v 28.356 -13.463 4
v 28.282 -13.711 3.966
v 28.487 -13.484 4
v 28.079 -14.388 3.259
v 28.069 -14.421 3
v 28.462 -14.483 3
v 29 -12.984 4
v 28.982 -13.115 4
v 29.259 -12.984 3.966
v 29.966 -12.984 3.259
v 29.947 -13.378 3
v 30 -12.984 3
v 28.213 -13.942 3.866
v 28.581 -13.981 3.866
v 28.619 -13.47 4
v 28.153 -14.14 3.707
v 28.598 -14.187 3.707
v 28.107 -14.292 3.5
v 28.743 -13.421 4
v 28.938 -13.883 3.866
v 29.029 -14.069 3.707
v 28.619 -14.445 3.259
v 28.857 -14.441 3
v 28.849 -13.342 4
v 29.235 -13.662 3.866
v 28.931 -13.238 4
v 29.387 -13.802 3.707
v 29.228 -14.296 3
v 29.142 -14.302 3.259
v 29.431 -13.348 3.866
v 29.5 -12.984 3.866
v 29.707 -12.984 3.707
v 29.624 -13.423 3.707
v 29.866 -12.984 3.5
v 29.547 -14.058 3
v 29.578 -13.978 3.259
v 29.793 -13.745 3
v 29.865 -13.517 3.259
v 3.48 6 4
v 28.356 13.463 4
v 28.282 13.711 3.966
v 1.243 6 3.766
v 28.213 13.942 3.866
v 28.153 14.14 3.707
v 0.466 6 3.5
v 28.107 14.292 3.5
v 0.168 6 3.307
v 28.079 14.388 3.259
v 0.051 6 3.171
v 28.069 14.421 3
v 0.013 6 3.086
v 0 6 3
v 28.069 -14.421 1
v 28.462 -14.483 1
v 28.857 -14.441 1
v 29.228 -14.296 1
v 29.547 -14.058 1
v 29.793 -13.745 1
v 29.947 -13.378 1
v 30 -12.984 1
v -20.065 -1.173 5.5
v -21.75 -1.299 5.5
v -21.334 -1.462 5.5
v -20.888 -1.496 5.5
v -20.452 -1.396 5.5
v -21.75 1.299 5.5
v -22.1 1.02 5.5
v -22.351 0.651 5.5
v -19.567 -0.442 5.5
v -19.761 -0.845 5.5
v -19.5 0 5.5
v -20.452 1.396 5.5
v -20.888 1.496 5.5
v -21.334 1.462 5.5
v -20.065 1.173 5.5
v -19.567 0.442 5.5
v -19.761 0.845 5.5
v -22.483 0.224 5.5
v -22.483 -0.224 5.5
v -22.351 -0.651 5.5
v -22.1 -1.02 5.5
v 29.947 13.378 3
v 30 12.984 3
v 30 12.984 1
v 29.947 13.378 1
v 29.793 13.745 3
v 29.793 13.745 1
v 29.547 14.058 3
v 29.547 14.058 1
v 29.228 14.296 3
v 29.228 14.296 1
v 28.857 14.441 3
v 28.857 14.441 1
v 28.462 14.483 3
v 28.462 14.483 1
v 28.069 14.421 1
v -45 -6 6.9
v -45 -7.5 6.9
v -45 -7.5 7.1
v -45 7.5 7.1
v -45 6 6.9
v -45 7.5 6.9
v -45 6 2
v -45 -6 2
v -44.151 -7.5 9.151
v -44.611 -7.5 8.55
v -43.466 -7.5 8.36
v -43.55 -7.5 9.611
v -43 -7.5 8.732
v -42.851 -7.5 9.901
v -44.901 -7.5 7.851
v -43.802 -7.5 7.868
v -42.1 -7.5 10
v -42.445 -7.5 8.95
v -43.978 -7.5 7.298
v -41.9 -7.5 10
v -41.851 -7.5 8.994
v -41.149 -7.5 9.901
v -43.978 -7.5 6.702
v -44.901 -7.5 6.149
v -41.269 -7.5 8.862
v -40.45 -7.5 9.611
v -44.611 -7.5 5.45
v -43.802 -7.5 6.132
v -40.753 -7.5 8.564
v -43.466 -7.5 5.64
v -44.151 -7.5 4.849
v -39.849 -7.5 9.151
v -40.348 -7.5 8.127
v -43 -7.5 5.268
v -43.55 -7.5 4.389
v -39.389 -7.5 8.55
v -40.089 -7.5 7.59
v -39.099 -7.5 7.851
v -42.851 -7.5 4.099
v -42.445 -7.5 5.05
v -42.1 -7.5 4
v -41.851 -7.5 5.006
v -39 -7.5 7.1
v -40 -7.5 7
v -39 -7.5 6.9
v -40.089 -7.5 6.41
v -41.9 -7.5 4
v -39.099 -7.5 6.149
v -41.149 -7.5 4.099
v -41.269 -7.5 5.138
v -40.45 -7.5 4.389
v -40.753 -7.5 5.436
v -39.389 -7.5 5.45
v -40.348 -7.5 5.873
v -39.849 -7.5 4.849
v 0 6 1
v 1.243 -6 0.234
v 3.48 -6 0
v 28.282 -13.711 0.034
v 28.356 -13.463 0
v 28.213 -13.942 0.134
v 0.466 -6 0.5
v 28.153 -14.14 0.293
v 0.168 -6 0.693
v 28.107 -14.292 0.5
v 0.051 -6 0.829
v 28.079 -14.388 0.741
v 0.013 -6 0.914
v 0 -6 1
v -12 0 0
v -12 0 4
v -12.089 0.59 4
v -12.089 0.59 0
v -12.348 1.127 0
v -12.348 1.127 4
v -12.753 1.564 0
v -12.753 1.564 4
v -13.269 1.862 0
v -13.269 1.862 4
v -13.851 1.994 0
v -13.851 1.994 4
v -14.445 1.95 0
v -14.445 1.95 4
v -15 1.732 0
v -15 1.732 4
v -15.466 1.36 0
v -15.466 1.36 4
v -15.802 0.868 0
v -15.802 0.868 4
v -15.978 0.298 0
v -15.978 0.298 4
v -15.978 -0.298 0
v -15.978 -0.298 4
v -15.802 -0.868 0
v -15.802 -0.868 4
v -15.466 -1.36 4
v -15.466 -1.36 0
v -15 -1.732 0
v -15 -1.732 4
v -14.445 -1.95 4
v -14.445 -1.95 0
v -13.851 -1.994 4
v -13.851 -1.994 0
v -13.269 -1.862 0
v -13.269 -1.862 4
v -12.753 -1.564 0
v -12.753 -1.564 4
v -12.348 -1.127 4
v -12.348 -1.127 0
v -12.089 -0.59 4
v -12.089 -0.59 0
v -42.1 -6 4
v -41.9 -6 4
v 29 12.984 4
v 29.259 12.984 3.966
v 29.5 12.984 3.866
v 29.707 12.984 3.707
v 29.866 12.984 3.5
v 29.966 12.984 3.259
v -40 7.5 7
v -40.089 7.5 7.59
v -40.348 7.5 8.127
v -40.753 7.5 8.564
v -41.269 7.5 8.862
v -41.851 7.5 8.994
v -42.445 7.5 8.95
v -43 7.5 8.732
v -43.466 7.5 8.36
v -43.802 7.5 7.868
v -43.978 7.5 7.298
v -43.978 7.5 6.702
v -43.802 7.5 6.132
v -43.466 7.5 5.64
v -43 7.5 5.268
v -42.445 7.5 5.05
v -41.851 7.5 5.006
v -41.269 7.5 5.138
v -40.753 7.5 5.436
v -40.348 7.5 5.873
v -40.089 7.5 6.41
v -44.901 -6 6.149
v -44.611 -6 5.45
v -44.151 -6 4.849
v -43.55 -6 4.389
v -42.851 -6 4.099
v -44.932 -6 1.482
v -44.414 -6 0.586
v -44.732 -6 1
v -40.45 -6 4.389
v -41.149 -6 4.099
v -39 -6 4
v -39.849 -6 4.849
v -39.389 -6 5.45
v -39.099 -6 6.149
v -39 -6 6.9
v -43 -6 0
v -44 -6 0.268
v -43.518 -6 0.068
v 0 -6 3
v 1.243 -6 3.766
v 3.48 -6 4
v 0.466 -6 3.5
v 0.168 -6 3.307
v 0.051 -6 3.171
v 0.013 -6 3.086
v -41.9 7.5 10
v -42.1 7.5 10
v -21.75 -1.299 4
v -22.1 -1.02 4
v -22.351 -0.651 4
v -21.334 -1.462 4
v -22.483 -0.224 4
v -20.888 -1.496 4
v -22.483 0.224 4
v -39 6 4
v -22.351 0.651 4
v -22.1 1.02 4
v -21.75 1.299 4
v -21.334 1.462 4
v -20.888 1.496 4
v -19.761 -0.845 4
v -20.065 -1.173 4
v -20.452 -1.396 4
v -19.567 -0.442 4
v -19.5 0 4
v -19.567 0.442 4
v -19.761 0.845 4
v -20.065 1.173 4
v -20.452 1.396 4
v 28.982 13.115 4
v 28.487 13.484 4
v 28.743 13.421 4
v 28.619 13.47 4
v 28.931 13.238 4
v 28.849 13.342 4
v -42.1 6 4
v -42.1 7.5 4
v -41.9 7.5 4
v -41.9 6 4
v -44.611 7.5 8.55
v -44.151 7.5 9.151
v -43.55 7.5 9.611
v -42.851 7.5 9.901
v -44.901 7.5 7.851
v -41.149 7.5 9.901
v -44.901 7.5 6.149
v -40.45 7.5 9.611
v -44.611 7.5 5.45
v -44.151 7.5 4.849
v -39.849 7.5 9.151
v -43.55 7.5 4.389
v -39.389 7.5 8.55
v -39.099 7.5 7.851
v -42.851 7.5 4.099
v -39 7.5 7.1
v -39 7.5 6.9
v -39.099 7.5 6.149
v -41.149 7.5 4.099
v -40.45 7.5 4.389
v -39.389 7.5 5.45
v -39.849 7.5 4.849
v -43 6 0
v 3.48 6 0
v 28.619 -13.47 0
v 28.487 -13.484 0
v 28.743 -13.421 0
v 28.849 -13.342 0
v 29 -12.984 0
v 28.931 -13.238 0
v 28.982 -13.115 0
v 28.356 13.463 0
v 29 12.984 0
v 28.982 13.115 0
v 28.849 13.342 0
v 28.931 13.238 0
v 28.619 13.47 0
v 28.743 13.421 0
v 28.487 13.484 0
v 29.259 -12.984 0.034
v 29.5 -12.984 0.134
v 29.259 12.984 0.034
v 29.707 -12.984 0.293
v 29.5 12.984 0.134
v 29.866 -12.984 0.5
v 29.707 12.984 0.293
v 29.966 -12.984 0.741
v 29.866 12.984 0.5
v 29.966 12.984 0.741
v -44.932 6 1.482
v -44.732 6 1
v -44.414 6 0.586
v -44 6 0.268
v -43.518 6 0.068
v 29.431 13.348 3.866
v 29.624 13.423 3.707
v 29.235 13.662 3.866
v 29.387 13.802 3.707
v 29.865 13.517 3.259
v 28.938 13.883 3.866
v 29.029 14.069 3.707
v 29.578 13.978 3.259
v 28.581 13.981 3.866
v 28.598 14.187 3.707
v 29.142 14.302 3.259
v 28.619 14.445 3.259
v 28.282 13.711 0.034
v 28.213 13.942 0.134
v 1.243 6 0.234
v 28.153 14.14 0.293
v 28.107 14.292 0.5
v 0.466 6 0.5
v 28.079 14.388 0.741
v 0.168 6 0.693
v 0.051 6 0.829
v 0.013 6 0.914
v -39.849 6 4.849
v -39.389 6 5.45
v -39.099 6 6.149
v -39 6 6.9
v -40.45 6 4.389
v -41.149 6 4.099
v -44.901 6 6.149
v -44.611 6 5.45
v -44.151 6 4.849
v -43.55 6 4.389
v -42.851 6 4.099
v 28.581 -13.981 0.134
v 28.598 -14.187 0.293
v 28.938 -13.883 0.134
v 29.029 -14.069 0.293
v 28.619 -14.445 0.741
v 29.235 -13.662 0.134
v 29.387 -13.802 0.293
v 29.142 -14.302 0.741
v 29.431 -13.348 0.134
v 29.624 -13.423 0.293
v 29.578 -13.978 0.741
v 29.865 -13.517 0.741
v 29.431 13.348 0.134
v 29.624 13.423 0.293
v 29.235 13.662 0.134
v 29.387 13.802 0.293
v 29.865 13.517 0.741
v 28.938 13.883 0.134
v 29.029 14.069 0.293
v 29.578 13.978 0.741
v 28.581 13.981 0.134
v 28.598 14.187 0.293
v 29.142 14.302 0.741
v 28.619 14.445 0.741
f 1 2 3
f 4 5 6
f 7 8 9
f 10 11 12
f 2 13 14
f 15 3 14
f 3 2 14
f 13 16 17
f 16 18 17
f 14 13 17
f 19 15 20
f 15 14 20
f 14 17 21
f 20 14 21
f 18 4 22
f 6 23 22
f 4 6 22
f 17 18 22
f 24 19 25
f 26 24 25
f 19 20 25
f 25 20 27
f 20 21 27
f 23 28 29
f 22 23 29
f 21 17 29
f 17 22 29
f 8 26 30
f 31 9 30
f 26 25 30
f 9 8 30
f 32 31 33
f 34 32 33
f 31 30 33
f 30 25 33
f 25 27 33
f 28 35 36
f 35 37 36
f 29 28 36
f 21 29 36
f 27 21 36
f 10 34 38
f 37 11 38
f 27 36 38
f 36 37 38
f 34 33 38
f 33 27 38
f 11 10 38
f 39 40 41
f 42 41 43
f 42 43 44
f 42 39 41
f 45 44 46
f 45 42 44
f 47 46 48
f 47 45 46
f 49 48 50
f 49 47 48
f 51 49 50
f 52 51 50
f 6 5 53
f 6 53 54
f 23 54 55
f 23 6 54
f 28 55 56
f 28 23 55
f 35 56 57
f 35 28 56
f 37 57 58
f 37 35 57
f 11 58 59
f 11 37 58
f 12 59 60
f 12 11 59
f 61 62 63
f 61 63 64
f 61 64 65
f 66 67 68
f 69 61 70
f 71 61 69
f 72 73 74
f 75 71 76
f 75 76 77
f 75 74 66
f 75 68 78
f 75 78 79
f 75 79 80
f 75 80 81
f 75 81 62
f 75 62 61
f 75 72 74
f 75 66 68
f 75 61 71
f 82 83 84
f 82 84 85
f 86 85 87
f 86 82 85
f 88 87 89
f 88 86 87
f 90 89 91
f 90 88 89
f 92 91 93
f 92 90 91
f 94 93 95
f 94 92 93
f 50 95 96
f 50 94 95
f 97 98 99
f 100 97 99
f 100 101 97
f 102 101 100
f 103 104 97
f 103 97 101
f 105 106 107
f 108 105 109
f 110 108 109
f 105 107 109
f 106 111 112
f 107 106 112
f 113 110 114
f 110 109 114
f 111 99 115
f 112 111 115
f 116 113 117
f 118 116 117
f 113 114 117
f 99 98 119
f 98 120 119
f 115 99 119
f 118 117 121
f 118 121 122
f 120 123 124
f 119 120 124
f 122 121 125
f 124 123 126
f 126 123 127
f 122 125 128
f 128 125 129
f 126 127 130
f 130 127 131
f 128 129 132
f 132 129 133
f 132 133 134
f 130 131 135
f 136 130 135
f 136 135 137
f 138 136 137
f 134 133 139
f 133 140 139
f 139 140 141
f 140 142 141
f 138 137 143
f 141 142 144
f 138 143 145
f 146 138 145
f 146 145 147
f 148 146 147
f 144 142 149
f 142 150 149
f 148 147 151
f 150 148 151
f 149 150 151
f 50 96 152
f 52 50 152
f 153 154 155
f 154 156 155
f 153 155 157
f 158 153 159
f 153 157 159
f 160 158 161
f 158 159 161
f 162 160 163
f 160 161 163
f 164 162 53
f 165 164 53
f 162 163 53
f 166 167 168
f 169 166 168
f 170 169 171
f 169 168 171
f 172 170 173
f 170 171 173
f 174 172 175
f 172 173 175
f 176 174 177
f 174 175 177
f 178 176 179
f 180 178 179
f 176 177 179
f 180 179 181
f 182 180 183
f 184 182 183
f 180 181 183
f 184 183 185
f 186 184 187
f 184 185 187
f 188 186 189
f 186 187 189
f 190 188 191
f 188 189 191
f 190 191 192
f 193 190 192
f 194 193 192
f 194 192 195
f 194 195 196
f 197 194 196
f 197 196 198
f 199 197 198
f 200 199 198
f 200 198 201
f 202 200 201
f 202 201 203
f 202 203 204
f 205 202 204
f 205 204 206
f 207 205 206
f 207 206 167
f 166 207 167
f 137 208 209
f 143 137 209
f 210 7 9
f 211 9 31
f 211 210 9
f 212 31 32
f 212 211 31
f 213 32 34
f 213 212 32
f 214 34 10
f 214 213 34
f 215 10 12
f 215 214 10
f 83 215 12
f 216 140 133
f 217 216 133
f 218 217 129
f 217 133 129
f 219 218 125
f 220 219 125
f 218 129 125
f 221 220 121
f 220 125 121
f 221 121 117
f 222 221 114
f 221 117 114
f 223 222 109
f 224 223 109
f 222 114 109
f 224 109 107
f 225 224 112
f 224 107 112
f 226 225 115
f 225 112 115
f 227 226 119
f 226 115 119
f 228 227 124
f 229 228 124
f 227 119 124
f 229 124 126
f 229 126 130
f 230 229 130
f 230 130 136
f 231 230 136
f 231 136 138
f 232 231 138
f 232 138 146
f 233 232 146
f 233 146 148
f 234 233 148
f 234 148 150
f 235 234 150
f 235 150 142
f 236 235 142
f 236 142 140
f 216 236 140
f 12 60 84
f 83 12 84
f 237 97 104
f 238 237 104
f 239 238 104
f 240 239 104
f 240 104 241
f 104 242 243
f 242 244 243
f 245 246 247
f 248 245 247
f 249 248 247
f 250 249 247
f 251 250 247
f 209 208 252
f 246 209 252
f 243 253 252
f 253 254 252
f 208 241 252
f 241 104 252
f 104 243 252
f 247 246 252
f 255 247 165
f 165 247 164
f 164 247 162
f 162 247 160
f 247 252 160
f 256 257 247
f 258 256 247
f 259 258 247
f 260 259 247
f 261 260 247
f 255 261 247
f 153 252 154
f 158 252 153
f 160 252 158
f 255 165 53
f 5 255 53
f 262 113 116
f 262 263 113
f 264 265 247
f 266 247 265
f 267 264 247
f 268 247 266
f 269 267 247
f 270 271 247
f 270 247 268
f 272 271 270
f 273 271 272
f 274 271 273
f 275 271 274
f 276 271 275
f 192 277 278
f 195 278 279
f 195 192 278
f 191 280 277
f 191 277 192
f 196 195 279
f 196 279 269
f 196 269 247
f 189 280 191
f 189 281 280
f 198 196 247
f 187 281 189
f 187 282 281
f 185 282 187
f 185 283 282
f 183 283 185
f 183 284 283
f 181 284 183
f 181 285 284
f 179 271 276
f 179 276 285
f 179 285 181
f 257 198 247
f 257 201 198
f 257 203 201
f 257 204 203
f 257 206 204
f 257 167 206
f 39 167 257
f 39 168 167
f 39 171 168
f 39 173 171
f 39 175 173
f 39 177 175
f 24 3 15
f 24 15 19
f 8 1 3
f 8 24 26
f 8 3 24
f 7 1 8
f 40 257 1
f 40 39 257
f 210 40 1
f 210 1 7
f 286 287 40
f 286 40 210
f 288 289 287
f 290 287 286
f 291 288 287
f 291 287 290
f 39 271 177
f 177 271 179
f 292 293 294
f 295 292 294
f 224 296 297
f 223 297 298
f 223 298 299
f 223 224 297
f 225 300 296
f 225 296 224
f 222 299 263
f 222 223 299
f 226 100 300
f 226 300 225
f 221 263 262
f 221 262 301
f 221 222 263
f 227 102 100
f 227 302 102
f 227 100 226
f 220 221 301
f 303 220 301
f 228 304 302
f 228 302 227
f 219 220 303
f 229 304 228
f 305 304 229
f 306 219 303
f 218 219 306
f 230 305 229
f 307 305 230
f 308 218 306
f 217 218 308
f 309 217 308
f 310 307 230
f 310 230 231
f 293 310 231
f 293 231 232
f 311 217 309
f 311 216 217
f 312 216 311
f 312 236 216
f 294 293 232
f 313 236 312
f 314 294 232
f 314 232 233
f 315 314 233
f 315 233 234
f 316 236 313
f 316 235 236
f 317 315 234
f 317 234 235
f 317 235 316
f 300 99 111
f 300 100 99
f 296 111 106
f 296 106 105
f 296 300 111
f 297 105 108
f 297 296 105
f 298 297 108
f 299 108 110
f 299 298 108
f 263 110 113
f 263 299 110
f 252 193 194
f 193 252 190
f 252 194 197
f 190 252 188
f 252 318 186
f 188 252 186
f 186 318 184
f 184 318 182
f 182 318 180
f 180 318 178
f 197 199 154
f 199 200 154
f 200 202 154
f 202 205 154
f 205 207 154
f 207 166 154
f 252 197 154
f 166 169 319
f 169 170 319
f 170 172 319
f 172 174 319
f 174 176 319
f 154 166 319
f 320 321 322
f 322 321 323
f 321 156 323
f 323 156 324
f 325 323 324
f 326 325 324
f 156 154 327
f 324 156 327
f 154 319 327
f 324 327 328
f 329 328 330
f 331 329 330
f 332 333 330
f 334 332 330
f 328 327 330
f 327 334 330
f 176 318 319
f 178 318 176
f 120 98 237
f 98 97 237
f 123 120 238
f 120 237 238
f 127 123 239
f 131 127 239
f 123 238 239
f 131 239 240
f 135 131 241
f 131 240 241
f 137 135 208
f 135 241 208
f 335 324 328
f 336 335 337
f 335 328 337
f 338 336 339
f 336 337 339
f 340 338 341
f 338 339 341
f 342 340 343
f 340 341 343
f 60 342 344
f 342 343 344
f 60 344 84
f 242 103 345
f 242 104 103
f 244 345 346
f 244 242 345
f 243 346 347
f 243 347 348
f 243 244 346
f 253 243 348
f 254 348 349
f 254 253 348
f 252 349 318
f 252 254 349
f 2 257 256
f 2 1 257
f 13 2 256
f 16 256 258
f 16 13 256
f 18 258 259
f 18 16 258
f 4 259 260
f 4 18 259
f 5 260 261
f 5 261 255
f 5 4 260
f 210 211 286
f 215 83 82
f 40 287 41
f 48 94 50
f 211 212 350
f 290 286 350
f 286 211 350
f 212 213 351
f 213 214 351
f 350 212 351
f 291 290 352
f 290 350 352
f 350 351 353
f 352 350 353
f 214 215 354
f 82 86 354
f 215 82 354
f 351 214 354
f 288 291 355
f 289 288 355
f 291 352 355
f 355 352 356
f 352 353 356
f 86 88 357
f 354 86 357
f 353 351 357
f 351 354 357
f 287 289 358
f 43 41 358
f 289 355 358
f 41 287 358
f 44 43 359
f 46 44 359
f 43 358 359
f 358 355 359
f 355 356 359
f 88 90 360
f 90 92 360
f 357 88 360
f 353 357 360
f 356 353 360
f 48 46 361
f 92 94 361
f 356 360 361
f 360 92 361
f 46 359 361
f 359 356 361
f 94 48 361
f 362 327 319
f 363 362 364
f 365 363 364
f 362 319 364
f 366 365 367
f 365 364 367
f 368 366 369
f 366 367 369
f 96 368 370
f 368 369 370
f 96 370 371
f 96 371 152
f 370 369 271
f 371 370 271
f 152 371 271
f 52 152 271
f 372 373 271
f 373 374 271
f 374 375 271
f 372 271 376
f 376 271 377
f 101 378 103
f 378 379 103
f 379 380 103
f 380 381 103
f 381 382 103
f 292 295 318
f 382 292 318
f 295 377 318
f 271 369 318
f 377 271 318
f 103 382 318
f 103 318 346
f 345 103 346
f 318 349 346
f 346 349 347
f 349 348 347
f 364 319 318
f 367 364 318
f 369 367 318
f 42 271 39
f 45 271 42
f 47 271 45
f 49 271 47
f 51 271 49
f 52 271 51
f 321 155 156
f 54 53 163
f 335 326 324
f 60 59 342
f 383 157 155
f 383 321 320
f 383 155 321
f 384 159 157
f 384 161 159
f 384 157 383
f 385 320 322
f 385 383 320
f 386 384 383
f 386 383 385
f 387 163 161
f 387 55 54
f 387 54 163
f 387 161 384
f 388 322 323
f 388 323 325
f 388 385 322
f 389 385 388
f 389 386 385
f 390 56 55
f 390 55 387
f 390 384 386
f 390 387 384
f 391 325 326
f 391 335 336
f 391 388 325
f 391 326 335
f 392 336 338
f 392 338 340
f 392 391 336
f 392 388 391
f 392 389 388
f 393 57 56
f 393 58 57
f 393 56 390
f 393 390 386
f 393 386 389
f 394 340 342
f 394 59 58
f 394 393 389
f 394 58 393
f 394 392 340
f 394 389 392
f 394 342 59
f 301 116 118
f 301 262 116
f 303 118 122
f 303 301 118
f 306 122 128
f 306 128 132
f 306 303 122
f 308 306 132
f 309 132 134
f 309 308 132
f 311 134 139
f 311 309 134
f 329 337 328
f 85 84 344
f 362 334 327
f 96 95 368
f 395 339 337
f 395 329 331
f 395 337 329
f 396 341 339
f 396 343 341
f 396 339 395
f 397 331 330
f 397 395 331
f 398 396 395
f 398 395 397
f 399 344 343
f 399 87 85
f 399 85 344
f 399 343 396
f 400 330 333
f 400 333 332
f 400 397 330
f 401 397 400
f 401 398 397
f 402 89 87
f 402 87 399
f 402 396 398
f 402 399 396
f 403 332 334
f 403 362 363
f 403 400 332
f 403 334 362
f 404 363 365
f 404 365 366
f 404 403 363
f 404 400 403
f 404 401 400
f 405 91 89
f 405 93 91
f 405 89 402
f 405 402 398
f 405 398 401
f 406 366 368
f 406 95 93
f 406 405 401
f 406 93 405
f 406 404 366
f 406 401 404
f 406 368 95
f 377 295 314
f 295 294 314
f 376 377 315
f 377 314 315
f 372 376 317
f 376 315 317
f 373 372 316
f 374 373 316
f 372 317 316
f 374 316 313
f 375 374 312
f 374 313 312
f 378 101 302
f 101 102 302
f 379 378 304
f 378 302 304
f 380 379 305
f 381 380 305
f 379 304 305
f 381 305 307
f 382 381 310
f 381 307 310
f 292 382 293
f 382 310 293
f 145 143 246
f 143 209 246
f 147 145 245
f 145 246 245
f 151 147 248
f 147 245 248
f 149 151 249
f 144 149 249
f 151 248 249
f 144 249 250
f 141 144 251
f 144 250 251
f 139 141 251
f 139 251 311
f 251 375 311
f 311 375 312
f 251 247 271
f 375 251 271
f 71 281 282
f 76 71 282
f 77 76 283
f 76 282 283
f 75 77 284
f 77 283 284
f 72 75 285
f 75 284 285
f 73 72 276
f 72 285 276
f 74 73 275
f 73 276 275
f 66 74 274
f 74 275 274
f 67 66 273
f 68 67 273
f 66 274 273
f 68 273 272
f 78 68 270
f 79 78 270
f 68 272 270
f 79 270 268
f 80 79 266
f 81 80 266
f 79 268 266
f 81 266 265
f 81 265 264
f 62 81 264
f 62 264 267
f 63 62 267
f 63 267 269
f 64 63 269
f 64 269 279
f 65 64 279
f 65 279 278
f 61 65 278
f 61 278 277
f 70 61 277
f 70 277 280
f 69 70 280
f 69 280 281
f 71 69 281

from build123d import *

# Parameters (mm, degrees)
PAD_DEPTH       = 4
FILLET_R        = 1.5
FILLET001_R     = 1
SKETCH003_R     = 1.5
PAD003_DEPTH    = 2
FILLET002_R     = 2
SKETCH004_W     = 6
SKETCH004_H     = 15
PAD004_DEPTH    = 6
SKETCH005_R     = 2
POCKET_DEPTH    = 21.984954
FILLET003_R     = 2.9
SKETCH006_R     = 2
POCKET001_DEPTH = 4.001


with BuildPart() as part:
    # Sketch → Pad (new body)
    with BuildSketch(Plane.XY):
        Polygon((0, 6), (-45, 6), (-45, -6), (0, -6), (30, -15), (30, 15), align=None)
    extrude(amount=PAD_DEPTH)

    # Fillet
    fillet_edges = [part.edges().sort_by_distance(p)[0] for p in [
        (30, 15, 2),
        (30, -15, 2),
    ]]
    fillet(fillet_edges, radius=FILLET_R)

    # Fillet001
    fillet001_edges = [part.edges().sort_by_distance(p)[0] for p in [
        (14.034489, 10.210347, 4),
        (14.034489, 10.210347, 0),
        (29.395396, 14.187393, 0),
        (29.395396, 14.187393, 4),
        (30, 0, 4),
        (30, 0, 0),
        (14.034489, -10.210347, 4),
        (14.034489, -10.210347, 0),
        (29.395396, -14.187393, 0),
        (29.395396, -14.187393, 4),
    ]]
    fillet(fillet001_edges, radius=FILLET001_R)

    # Sketch003 → Pad003 (join)
    with BuildSketch(Plane.XY.offset(3.5)):
        with Locations((-21, 0)):
            Circle(SKETCH003_R)
    extrude(amount=PAD003_DEPTH)

    # Fillet002
    fillet002_edges = [part.edges().sort_by_distance(p)[0] for p in [
        (-45, 0, 0),
    ]]
    fillet(fillet002_edges, radius=FILLET002_R)

    # Sketch004 (on Face6 of Fillet002) → Pad004 (join)
    with BuildSketch(Plane.XY.offset(4)):
        with Locations((-42, 0)):
            Rectangle(SKETCH004_W, SKETCH004_H)
    extrude(amount=PAD004_DEPTH)

    # Sketch005 (on Face17 of Pad004) → Pocket (cut, through all)
    with BuildSketch(Plane.XZ.offset(7.5)):
        with Locations((-42, 7)):
            Circle(SKETCH005_R)
    extrude(amount=-POCKET_DEPTH, mode=Mode.SUBTRACT)

    # Fillet003
    fillet003_edges = [part.edges().sort_by_distance(p)[0] for p in [
        (-45, 0, 10),
        (-39, 0, 10),
        (-45, -6.75, 4),
        (-39, -6.75, 4),
        (-45, 6.75, 4),
        (-39, 6.75, 4),
    ]]
    fillet(fillet003_edges, radius=FILLET003_R)

    # Sketch006 (on Face8 of Fillet003) → Pocket001 (cut, through all)
    with BuildSketch(Plane.XY.offset(4)):
        with Locations((-14, 0)):
            Circle(SKETCH006_R)
    extrude(amount=-POCKET001_DEPTH, mode=Mode.SUBTRACT)


solid = part.part
